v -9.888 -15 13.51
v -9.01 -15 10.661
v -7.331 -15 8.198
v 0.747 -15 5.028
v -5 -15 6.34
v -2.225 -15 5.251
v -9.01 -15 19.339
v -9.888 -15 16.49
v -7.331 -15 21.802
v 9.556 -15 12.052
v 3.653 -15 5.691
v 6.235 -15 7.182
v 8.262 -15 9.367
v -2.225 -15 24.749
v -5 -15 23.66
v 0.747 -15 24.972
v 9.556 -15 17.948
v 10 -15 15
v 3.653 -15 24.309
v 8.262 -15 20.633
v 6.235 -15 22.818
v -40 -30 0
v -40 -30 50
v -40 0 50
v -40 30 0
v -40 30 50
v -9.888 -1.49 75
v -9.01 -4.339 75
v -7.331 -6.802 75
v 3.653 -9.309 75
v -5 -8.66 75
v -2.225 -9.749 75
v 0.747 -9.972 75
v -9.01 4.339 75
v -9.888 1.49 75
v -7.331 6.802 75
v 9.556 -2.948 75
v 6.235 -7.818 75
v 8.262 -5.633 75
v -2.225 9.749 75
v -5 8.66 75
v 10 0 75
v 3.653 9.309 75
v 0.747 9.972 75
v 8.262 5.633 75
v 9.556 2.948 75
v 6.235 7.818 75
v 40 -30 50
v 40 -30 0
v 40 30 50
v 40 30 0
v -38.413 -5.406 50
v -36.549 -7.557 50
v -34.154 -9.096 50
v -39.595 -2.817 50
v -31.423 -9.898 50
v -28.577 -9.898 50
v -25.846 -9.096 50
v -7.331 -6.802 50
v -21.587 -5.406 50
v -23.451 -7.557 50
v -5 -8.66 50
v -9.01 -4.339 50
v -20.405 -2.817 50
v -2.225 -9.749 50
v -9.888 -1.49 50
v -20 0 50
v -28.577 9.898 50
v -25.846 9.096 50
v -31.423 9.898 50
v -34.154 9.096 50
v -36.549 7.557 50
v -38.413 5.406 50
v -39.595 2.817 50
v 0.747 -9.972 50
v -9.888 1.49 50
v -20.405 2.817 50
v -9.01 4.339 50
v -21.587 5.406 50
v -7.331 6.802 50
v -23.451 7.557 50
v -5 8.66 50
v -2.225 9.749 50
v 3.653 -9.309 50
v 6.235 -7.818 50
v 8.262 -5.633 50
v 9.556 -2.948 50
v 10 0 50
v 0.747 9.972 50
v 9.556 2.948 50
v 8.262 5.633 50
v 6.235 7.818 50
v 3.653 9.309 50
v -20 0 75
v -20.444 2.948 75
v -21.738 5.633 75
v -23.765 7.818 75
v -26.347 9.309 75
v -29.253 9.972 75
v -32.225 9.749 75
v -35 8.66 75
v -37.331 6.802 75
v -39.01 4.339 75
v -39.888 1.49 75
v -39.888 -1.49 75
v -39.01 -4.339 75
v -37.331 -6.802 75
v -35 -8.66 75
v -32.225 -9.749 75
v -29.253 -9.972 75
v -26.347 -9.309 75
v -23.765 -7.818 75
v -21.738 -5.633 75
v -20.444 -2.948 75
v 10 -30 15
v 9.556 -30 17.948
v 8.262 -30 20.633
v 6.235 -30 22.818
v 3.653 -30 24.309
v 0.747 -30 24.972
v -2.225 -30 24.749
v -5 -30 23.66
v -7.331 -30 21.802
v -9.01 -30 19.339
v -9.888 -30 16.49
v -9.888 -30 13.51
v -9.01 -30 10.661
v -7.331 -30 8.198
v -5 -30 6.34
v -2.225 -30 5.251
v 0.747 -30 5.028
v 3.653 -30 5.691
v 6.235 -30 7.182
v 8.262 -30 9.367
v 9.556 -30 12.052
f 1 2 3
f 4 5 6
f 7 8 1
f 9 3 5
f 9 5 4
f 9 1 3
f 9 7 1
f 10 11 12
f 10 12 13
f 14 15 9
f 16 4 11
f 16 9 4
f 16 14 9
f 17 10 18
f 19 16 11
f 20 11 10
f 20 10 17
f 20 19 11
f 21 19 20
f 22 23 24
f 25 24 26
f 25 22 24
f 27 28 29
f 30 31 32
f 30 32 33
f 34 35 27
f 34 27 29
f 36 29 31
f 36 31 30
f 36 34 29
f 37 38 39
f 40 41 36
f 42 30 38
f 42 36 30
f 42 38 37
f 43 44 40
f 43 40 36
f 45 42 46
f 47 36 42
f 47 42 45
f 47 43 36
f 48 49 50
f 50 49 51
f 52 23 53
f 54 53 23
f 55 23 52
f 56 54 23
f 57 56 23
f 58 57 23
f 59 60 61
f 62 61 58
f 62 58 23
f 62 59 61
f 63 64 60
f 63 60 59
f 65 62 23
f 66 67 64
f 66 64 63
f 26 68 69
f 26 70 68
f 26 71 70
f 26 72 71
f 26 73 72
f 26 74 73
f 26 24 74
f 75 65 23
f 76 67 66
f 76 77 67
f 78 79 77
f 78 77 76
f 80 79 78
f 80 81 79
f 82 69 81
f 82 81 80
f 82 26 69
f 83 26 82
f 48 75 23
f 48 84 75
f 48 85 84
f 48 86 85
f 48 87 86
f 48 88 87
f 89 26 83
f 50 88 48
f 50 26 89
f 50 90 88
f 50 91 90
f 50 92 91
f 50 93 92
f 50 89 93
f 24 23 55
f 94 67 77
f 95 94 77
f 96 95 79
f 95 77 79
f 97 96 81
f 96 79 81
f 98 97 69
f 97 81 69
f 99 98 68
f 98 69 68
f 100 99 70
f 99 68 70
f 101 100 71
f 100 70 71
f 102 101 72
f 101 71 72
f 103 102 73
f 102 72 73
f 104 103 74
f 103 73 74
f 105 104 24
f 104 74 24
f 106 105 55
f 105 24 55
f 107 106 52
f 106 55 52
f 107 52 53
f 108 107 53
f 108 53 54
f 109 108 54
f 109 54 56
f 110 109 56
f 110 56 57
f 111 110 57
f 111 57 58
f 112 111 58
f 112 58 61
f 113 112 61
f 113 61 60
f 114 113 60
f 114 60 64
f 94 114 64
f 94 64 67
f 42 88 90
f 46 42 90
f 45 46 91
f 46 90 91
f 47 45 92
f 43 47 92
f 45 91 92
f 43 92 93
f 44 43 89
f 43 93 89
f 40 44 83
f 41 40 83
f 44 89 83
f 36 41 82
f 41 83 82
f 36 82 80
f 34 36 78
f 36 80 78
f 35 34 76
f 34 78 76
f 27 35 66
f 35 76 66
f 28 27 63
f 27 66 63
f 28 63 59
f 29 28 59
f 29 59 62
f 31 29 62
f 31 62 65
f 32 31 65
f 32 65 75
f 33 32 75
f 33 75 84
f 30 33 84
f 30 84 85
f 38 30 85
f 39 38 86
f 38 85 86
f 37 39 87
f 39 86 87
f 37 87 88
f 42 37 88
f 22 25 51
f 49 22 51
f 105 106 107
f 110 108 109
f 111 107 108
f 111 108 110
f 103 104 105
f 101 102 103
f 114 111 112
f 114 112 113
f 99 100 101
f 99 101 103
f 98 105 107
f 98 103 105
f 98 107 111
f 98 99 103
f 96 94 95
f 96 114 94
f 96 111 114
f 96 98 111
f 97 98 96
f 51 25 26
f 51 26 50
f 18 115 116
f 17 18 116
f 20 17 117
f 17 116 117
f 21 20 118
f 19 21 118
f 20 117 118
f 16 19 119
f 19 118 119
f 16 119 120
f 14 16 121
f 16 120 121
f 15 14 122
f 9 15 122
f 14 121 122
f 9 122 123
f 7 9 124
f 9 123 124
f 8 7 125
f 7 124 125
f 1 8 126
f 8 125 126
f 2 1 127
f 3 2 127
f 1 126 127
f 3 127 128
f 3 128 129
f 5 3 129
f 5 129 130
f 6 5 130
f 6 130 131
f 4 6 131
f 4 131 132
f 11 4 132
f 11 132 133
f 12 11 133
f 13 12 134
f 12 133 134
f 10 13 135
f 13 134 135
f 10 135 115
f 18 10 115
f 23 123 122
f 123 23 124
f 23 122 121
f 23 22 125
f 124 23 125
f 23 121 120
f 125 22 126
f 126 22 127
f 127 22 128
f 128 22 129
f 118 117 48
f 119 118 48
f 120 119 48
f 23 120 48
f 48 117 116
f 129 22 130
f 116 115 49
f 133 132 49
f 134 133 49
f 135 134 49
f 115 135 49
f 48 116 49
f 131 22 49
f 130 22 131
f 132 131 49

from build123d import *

# Parameters (mm, degrees)
F0_W     = 80
F0_H     = 60
F1_DEPTH = 50
F3_DEPTH = 25
F4_R     = 10
F5_DEPTH = 25
F6_R     = 10
F7_DEPTH = 15


with BuildPart() as f1:
    # F0 (on Top) → F1 (new body)
    with BuildSketch(Plane.XY):
        Rectangle(F0_W, F0_H)
    extrude(amount=F1_DEPTH)

    # F2 (on face) → F3 (join)
    with BuildSketch(Plane.XY.offset(50)):
        with BuildLine():
            ThreePointArc((-40, 0), (-30, -10), (-20, 0))
            ThreePointArc((-20, 0), (-30, 10), (-40, 0))
        make_face()
    extrude(amount=F3_DEPTH)

    # F4 (on face) → F5 (join)
    with BuildSketch(Plane.XY.offset(50)):
        Circle(F4_R)
    extrude(amount=F5_DEPTH)

    # F6 (on face) → F7 (cut)
    with BuildSketch(Plane.XZ.offset(30)):
        with Locations((0, 15)):
            Circle(F6_R)
    extrude(amount=-F7_DEPTH, mode=Mode.SUBTRACT)


solid = f1.part
